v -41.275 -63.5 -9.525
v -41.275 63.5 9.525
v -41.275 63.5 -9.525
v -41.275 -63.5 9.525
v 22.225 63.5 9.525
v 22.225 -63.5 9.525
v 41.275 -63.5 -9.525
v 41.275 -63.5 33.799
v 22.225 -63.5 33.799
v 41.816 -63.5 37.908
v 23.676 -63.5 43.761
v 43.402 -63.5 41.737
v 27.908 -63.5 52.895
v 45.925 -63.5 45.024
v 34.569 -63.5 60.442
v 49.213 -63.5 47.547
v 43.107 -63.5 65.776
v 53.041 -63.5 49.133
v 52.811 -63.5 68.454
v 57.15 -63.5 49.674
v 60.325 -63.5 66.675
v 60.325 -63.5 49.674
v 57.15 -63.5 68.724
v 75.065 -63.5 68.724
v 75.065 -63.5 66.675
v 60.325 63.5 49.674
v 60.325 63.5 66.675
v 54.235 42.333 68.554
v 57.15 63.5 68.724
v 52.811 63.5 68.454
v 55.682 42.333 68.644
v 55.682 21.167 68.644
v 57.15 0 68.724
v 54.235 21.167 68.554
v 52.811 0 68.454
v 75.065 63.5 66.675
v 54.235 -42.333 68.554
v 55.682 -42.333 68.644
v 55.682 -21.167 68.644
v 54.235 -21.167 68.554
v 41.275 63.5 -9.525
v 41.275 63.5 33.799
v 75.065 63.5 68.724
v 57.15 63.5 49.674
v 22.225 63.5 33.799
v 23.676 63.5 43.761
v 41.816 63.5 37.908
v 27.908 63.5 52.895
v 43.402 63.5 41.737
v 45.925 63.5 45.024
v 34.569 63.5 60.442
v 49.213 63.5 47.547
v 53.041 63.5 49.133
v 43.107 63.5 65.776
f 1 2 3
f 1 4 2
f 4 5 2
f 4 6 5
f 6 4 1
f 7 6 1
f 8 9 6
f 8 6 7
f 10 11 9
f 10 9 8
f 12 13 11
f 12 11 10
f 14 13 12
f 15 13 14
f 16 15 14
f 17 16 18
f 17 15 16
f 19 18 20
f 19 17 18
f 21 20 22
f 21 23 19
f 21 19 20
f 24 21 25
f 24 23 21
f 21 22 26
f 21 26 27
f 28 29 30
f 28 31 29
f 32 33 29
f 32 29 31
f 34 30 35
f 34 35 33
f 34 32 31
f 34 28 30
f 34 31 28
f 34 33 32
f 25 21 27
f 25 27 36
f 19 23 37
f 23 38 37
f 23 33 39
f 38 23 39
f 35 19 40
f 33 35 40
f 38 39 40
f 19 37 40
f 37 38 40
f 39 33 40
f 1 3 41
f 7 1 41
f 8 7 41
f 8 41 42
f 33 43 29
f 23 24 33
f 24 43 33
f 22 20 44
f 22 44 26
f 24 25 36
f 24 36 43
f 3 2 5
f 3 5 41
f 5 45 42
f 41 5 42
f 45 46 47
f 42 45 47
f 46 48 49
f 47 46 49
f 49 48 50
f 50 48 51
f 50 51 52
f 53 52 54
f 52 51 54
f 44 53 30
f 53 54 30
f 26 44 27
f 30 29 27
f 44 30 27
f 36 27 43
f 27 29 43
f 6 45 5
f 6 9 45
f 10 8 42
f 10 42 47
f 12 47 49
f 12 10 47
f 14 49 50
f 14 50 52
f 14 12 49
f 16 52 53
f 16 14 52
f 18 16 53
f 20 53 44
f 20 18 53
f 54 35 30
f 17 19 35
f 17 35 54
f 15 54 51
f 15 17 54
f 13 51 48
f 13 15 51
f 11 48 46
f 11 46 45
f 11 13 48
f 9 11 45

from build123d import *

# Parameters (mm, degrees)
F1_DEPTH = 63.5


with BuildPart() as f1:
    # F0 (on Front) → F1 (new body, symmetric)
    with BuildSketch(Plane.XZ):
        Polygon((-41.275, 9.525), (-41.275, -9.525), (41.275, -9.525), (41.275, 9.525), (22.225, 9.525), align=None)
        with BuildLine():
            Line((22.225, 9.525), (41.275, 9.525))
            Line((41.275, 9.525), (41.275, 33.799117))
            ThreePointArc((41.275, 33.799117), (45.92468, 45.024437), (57.15, 49.674117))
            Line((57.15, 49.674117), (60.325, 49.674117))
            Line((60.325, 49.674117), (60.325, 66.675))
            Line((60.325, 66.675), (75.065107, 66.675))
            Line((75.065107, 66.675), (75.065107, 68.724117))
            Line((75.065107, 68.724117), (57.15, 68.724117))
            add(Edge.make_bspline(
                [(57.15, 68.724117), (55.670657, 68.648754), (54.224595, 68.558388), (52.81074, 68.453502)],
                knots=[0, 0, 0, 0, 2.4695, 2.4695, 2.4695, 2.4695], degree=3))
            ThreePointArc((52.81074, 68.453502), (30.96504, 56.909796), (22.225, 33.799117))
            Line((22.225, 33.799117), (22.225, 9.525))
        make_face()
    extrude(amount=F1_DEPTH, both=True)


solid = f1.part
